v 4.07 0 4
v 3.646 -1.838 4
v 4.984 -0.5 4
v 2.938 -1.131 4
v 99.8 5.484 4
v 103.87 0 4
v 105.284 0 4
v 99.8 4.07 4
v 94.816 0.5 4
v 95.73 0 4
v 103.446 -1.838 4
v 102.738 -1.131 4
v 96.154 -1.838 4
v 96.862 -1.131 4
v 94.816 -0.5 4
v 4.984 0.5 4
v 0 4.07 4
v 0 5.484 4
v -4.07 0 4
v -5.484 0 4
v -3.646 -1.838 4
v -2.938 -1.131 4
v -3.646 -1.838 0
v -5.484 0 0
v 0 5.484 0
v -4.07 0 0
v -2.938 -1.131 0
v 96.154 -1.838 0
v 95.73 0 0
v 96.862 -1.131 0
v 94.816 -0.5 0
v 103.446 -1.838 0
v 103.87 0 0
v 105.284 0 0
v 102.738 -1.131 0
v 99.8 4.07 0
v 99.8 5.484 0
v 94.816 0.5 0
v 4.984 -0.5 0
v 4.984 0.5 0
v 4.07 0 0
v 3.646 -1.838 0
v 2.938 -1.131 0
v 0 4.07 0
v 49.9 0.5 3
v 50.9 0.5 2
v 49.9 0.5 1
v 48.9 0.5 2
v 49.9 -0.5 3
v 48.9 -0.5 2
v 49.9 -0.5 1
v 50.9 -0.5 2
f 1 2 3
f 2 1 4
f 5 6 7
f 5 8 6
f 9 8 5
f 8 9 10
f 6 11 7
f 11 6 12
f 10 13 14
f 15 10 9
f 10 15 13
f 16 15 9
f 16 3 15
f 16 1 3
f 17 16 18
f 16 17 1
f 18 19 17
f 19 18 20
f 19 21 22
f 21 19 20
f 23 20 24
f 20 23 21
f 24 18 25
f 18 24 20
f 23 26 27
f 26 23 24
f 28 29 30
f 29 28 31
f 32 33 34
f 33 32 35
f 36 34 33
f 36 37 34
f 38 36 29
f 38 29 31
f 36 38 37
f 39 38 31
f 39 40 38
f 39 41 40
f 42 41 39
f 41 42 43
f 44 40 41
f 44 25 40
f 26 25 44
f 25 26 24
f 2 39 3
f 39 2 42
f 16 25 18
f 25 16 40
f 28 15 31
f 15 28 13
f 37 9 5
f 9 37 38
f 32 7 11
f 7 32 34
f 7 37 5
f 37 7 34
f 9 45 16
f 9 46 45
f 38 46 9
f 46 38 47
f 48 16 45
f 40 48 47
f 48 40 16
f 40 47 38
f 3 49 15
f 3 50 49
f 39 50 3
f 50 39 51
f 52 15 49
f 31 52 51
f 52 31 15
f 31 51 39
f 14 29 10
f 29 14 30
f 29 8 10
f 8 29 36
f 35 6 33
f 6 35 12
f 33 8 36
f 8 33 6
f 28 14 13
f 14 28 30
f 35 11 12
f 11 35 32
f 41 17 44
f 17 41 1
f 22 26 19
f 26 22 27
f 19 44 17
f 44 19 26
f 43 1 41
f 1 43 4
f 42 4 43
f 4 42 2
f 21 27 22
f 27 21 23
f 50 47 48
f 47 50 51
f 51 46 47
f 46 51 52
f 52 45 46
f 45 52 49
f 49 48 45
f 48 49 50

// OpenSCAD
Tripmine_Cube_Size = 100; // 0.01
Tolerance = 0.2; // 0.01
Brace_Offset = 0; // 0.01
Brace_Thickness = 1; // 0.01
Brace_Width = 4; // 0.01
Center_Punch_Size = 2; // 0.01
Clip_Finger_Length = 1.5; // 0.01

SQRT2 = sqrt(2);
Finger_Cutout = (Brace_Thickness + Clip_Finger_Length) * SQRT2;
Bar_Size = Tripmine_Cube_Size / 18;
Bar_ID = Bar_Size + Tolerance;
Bar_OD = Bar_Size + Brace_Thickness*2 + Tolerance;
Brace_Extension = Brace_Offset + Brace_Thickness/2 > Bar_OD / 2 * SQRT2
	? Brace_Offset + Brace_Thickness/3 - Bar_ID/2 * SQRT2
	: 0;

module rotated_box(offsetXY = 0, offsetZ = 0) {
	translate([0, 0, Brace_Width/2])
		rotate(45, [0,0,1])
			cube([Bar_Size+offsetXY, Bar_Size+offsetXY, Brace_Width+offsetZ], center=true);
}

difference() {
	union() {
		rotated_box(offsetXY=Brace_Thickness*2+Tolerance); //  Left clip body
		translate([Tripmine_Cube_Size-Tolerance, 0, 0])
			rotated_box(offsetXY=Brace_Thickness*2+Tolerance); // Right clip body
		translate([0, Brace_Offset-Brace_Thickness/2, 0])
			cube([Tripmine_Cube_Size-Tolerance, Brace_Thickness, Brace_Width]); // Main brace body
		if (Brace_Extension > 0) {
			translate([0, Brace_Offset+Brace_Thickness/2-Brace_Extension, 0]) {
				cube([Brace_Thickness, Brace_Extension, Brace_Width]); // Left brace extension
				translate([Tripmine_Cube_Size-Tolerance-Brace_Thickness, 0, 0])
					cube([Brace_Thickness, Brace_Extension, Brace_Width]); // Right brace extension
			}
		}
	}

	rotated_box(offsetXY=Tolerance, offsetZ=2); // Left hole
	translate([0, -Finger_Cutout, 0])
		rotated_box(offsetXY=Brace_Thickness*2, offsetZ=1); // Left finger cutout

	translate([Tripmine_Cube_Size-Tolerance, 0, 0]) {
		rotated_box(offsetXY=Tolerance, offsetZ=1); // Right hole
		translate([0, -Finger_Cutout, 0])
			rotated_box(offsetXY=Brace_Thickness*2, offsetZ=1); // Right finger cutout
	}

	translate([(Tripmine_Cube_Size-Tolerance)/2, Brace_Offset-Brace_Thickness/2-1, Brace_Width/2])
		rotate(-90, [1,0,0])
			cylinder(d=Center_Punch_Size, h=Brace_Thickness+2, $fn=4); // Center punch
}
